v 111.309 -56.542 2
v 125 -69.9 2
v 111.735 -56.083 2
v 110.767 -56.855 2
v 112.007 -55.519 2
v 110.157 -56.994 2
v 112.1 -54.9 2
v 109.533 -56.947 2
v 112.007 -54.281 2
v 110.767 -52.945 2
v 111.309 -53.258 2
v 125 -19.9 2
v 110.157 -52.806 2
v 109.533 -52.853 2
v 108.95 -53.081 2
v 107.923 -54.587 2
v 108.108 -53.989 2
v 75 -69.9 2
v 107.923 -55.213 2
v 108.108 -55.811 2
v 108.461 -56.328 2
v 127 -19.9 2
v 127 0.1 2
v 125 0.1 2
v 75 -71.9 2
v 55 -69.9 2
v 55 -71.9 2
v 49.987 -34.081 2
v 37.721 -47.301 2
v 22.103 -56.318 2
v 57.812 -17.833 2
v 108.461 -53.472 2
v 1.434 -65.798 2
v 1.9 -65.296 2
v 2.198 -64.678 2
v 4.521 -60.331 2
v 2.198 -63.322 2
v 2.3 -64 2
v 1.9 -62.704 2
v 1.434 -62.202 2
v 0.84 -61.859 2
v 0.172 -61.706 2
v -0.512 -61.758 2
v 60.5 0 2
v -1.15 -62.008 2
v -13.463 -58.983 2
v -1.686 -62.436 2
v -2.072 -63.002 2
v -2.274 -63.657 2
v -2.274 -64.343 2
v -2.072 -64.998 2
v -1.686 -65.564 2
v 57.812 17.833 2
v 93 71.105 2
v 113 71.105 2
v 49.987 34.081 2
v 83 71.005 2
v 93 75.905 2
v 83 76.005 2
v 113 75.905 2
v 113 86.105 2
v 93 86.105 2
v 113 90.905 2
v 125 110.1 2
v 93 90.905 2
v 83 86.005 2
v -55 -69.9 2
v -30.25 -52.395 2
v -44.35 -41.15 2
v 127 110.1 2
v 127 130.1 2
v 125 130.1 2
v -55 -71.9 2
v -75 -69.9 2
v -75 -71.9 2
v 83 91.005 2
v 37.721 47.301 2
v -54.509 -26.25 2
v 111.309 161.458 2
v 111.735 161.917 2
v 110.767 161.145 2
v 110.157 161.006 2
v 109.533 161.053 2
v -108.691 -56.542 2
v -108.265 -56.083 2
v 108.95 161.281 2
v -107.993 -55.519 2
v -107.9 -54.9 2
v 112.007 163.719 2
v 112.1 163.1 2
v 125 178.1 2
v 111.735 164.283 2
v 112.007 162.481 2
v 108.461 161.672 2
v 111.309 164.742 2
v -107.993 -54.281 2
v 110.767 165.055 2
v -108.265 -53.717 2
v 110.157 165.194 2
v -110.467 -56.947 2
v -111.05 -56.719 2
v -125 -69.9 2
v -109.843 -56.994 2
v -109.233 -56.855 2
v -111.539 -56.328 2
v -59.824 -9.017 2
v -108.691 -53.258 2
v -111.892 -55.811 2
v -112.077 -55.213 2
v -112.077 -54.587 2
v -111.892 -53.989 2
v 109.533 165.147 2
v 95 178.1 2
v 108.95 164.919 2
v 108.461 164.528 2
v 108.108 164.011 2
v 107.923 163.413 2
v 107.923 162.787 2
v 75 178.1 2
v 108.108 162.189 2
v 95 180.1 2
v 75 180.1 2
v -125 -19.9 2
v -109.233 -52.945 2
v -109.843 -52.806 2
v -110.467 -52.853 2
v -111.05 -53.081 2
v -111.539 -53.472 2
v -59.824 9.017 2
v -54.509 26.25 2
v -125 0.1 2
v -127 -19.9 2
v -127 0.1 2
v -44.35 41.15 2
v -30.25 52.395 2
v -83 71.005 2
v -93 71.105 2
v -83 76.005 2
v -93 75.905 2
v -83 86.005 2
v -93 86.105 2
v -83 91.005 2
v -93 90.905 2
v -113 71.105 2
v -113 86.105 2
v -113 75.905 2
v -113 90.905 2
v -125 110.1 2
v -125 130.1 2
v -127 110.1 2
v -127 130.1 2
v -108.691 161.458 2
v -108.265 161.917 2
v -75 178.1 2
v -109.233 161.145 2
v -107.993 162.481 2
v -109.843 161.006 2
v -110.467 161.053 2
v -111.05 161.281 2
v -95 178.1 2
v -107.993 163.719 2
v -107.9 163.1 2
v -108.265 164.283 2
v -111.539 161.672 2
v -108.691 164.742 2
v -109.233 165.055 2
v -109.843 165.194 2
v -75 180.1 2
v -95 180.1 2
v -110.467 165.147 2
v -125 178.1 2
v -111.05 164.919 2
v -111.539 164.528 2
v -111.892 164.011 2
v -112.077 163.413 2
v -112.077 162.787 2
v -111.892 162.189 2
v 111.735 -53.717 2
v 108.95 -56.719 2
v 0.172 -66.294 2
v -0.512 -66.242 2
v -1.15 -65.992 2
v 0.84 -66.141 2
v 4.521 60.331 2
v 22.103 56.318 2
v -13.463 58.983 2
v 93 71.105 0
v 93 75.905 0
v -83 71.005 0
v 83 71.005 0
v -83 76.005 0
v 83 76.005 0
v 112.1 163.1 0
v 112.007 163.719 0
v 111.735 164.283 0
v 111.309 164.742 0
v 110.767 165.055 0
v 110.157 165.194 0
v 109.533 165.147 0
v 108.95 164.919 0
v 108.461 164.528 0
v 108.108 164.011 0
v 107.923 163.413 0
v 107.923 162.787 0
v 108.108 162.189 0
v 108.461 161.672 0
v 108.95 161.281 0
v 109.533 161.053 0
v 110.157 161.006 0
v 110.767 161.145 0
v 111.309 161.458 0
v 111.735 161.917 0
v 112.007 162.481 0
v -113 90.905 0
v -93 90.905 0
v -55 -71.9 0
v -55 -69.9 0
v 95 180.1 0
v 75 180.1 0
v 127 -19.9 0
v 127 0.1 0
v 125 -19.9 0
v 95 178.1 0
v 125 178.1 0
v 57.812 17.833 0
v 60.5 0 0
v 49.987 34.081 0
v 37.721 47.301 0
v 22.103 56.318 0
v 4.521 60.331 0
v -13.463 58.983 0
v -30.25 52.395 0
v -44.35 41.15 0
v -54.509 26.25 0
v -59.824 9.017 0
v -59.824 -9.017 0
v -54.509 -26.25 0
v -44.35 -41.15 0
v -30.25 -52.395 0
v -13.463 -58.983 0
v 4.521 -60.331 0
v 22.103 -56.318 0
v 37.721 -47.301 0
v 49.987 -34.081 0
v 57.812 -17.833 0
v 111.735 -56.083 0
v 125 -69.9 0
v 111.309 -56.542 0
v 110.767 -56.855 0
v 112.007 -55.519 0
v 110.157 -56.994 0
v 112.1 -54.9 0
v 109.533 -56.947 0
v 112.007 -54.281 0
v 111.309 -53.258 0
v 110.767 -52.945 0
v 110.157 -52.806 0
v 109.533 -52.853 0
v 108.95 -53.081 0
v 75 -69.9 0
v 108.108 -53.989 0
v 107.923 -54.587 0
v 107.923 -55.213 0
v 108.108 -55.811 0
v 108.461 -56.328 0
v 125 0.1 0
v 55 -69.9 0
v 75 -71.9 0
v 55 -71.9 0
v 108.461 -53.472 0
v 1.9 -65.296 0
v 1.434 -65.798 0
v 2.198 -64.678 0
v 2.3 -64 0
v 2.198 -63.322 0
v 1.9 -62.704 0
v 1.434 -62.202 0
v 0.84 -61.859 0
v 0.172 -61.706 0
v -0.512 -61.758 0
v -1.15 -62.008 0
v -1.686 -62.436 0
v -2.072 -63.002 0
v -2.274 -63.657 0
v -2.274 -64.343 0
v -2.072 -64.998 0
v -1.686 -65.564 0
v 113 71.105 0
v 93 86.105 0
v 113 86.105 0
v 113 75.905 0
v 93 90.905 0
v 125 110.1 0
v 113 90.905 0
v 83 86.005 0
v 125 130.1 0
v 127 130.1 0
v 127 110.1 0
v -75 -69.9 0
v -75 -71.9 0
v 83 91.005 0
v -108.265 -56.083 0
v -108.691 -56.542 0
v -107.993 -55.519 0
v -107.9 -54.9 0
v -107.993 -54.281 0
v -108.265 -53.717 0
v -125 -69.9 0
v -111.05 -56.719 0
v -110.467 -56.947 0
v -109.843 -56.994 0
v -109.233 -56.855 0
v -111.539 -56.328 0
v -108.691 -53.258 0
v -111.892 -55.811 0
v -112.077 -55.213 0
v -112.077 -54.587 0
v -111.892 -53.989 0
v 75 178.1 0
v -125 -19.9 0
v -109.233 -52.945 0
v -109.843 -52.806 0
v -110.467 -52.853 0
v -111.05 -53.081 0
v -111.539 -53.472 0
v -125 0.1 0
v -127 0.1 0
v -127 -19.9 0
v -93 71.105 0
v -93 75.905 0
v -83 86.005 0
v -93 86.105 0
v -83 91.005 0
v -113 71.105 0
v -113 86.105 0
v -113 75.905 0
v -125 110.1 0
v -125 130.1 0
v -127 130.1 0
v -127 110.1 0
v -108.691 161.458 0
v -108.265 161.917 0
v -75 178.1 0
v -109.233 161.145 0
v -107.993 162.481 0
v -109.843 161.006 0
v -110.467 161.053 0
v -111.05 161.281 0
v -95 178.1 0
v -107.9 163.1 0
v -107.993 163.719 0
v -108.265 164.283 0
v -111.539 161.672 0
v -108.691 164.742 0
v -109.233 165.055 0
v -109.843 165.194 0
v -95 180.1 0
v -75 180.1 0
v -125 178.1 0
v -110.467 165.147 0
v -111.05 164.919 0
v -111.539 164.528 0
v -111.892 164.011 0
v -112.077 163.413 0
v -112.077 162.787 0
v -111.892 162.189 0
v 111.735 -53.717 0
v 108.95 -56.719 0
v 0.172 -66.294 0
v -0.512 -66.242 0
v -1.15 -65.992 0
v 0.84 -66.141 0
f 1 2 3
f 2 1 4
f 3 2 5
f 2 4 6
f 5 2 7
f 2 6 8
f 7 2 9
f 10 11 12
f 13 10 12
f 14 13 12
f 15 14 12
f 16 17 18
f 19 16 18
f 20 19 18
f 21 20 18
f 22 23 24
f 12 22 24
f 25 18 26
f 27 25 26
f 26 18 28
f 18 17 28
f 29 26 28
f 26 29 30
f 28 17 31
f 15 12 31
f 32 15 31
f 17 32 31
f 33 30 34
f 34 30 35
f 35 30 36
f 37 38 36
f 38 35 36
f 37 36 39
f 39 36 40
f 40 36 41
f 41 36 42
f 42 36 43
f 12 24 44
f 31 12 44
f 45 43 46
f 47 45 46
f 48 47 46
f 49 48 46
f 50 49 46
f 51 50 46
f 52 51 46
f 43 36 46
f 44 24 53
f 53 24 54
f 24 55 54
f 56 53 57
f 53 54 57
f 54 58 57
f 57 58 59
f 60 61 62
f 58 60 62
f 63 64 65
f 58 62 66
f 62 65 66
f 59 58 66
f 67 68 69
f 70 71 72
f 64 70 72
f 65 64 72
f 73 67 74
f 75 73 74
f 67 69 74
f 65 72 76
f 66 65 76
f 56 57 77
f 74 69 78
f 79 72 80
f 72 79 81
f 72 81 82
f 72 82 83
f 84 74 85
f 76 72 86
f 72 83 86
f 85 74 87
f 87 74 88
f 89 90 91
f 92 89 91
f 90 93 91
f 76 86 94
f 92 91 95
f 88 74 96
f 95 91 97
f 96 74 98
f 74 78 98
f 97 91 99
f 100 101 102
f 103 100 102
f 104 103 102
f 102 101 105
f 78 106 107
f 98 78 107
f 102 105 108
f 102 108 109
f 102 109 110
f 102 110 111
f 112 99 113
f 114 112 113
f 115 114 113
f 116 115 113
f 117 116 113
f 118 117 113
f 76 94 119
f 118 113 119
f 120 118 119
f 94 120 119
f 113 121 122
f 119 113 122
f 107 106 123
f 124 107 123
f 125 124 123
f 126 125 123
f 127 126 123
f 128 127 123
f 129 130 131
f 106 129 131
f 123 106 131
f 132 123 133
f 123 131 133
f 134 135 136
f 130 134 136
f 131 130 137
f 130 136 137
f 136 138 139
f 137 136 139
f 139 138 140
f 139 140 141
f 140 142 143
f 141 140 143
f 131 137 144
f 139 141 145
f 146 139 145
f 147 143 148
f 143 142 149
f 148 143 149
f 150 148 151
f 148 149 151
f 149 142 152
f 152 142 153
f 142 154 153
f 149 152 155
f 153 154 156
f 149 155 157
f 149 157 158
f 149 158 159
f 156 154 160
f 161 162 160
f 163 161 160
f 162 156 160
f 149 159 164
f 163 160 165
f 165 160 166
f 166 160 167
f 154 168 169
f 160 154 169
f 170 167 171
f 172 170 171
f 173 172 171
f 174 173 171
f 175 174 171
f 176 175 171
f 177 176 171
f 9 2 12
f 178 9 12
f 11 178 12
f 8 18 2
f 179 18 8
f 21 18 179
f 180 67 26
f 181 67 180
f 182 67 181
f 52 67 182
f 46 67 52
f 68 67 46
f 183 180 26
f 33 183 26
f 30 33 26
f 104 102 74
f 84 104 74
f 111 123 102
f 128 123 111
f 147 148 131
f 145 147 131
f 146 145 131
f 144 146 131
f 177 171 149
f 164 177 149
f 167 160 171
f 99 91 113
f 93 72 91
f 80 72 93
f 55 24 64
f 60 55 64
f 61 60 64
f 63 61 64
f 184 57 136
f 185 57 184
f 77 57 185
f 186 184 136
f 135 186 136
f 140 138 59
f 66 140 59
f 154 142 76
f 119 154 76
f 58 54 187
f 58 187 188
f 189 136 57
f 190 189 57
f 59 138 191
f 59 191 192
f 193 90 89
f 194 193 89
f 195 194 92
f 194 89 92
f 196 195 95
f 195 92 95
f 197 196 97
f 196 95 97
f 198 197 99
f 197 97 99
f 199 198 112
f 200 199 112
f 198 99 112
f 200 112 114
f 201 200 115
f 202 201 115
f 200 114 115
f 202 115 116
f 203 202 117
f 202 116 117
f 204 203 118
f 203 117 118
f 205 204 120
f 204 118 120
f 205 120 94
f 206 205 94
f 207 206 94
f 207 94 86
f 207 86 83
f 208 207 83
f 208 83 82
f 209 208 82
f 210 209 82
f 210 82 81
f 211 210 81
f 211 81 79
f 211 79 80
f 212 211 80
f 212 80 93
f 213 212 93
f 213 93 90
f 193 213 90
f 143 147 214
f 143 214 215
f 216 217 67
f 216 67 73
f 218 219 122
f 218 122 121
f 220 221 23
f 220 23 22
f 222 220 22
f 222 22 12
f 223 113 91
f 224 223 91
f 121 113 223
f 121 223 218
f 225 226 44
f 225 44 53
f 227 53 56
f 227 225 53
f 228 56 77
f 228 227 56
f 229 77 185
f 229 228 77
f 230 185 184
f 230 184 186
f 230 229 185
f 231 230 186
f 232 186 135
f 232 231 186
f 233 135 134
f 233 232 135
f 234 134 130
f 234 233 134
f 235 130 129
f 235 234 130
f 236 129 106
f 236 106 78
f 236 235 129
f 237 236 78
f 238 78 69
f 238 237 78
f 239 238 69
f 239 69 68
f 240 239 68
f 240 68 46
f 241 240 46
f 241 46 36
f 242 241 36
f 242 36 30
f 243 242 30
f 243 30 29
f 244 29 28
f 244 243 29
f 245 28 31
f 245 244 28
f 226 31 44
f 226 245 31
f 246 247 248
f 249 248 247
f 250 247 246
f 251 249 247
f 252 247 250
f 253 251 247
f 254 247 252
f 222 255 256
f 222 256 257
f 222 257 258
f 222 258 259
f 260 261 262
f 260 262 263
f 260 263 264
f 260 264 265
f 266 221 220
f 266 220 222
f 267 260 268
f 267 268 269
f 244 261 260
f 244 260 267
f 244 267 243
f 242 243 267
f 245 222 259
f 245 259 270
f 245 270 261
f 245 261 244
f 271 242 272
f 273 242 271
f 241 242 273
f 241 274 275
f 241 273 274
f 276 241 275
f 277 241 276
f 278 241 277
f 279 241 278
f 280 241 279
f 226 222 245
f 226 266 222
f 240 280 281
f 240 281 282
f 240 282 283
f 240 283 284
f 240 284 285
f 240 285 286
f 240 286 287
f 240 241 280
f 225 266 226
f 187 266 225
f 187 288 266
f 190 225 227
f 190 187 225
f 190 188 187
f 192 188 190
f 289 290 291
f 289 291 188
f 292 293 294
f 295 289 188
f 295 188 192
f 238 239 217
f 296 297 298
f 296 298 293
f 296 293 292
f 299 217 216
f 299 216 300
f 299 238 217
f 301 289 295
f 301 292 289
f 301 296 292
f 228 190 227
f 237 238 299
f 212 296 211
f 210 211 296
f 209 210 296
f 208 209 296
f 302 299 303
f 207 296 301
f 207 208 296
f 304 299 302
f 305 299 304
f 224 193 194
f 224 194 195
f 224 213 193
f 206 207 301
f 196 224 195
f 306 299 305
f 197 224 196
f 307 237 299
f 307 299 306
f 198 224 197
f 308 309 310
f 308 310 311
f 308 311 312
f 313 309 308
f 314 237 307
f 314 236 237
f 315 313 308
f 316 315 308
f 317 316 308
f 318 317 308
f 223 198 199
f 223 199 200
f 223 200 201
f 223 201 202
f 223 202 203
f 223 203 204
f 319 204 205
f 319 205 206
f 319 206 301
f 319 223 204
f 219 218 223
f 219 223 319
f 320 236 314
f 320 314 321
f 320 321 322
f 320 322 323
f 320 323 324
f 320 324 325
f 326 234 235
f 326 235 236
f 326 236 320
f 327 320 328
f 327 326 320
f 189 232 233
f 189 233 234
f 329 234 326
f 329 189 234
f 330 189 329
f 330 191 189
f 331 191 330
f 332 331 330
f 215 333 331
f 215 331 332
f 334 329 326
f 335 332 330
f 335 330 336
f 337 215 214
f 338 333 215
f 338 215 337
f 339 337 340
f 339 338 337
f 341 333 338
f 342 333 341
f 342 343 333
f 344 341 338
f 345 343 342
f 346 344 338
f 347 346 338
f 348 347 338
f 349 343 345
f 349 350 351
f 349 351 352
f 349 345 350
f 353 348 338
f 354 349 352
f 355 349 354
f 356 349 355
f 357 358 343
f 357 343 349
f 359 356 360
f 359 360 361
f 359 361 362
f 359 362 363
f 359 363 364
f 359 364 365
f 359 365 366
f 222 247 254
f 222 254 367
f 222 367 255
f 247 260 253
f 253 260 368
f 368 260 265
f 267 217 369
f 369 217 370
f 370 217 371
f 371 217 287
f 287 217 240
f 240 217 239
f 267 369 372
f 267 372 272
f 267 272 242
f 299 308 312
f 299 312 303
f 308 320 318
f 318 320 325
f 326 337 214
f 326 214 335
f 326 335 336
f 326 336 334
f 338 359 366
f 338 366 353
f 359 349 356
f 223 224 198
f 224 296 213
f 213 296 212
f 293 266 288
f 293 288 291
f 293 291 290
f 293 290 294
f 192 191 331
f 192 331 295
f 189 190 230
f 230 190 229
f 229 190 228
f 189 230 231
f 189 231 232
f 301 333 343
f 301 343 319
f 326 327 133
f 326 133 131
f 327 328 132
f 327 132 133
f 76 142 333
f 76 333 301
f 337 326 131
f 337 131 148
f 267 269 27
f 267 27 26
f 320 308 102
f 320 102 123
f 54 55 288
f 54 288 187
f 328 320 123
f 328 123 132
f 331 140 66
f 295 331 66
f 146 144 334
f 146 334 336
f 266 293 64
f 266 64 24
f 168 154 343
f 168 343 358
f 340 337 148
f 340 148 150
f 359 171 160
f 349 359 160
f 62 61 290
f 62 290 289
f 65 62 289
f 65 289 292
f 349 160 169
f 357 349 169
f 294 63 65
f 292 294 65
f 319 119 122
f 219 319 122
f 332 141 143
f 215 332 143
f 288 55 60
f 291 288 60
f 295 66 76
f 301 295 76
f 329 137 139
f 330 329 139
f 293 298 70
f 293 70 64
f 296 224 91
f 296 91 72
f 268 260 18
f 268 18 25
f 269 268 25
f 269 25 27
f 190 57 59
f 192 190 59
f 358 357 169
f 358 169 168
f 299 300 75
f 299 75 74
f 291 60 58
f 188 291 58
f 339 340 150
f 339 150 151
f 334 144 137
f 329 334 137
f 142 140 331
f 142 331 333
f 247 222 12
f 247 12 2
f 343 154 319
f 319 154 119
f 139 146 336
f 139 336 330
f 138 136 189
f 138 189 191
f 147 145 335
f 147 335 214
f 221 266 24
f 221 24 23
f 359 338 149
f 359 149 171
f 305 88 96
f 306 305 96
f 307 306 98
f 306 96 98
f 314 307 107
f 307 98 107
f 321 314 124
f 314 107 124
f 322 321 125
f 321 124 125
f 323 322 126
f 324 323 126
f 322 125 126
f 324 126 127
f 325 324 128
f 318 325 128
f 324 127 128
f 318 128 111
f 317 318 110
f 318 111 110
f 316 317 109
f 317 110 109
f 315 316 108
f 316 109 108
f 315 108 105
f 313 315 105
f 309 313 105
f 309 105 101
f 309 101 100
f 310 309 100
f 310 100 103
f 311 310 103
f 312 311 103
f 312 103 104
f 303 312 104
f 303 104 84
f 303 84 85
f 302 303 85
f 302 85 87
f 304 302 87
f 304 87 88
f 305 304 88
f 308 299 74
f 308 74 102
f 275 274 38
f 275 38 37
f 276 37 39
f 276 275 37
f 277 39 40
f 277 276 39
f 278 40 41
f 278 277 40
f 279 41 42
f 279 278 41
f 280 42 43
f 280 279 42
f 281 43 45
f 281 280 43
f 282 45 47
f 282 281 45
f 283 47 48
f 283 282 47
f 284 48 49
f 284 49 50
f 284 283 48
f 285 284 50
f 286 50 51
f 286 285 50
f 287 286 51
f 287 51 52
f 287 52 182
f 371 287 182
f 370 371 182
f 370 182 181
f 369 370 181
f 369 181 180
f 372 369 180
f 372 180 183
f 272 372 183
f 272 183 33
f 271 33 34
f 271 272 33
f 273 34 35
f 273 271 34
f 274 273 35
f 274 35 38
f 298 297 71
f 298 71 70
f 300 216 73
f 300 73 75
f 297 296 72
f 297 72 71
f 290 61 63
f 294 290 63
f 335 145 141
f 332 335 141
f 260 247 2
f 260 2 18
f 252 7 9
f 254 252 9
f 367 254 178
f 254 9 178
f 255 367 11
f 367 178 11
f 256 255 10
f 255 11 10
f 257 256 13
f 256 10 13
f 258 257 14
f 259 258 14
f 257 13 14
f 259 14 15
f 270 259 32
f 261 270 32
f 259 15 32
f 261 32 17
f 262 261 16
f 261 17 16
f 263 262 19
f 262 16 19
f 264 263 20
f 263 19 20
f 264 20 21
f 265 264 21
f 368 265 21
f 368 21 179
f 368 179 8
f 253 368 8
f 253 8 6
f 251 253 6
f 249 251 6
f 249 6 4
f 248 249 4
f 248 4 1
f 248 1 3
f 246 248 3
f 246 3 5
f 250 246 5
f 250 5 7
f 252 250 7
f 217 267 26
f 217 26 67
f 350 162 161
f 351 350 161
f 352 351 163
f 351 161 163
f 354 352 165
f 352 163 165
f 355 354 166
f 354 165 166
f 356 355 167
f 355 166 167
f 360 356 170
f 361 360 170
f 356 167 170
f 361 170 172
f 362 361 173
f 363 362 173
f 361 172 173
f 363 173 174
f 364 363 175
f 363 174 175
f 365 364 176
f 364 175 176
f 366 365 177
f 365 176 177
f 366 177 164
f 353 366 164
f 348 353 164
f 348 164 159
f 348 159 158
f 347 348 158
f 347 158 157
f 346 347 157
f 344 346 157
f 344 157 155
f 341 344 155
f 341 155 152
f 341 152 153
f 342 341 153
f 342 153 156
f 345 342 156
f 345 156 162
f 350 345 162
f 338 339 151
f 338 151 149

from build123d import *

# Parameters (mm, degrees)
SKETCH1_R           = 60.5
SKETCH1_R_2         = 2.3
BOSS_EXTRUDE1_DEPTH = 2
SKETCH3_W           = 20
SKETCH3_H           = 4.8
CUT_EXTRUDE1_DEPTH  = 5
SKETCH4_W           = 165.999999998
SKETCH4_H           = 5
CUT_EXTRUDE2_DEPTH  = 5
SKETCH5_R           = 2.1
CUT_EXTRUDE3_DEPTH  = 5
SKETCH6_W           = 30
SKETCH6_H           = 2
SKETCH6_W_2         = 150
CUT_EXTRUDE4_DEPTH  = 5
SKETCH7_R           = 2.1
CUT_EXTRUDE5_DEPTH  = 5


with BuildPart() as part:
    # Sketch1 → Boss-Extrude1 (new body)
    with BuildSketch(Plane.XY):
        Polygon((125.000000001, -69.9), (75.000000001, -69.9), (75.000000001, -71.9), (55.000000001, -71.9), (55.000000001, -69.9), (-54.999999999, -69.9), (-54.999999999, -71.9), (-74.999999999, -71.9), (-74.999999999, -69.9), (-124.999999999, -69.9), (-124.999999999, -19.9), (-126.999999999, -19.9), (-126.999999999, 0.1), (-124.999999999, 0.1), (-124.999999999, 110.1), (-126.999999999, 110.1), (-126.999999999, 130.1), (-124.999999999, 130.1), (-124.999999999, 180.1), (125.000000001, 180.1), (125.000000001, 130.1), (127.000000001, 130.1), (127.000000001, 110.1), (125.000000001, 110.1), (125.000000001, 0.1), (127.000000001, 0.1), (127.000000001, -19.9), (125.000000001, -19.9), align=None)
        Circle(SKETCH1_R, mode=Mode.SUBTRACT)
        with Locations((0, -64)):
            Circle(SKETCH1_R_2, mode=Mode.SUBTRACT)
    extrude(amount=BOSS_EXTRUDE1_DEPTH)

    # Sketch3 → Cut-Extrude1 (cut)
    with BuildSketch(Plane.XY.offset(2)):
        with Locations((-102.999999999, 88.505234687)):
            Rectangle(SKETCH3_W, SKETCH3_H)
        with Locations((-102.999999999, 73.505234687)):
            Rectangle(SKETCH3_W, SKETCH3_H)
    cut_extrude1 = extrude(amount=-CUT_EXTRUDE1_DEPTH, mode=Mode.SUBTRACT)

    # Mirror1: Cut-Extrude1 across plane
    add(cut_extrude1.mirror(Plane(origin=(0, 0, 0), x_dir=(0, 0, 1), z_dir=(1, 0, 0))), mode=Mode.SUBTRACT)

    # Sketch4 → Cut-Extrude2 (cut)
    with BuildSketch(Plane.XY.offset(2)):
        with Locations((0, 88.505234687)):
            Rectangle(SKETCH4_W, SKETCH4_H)
        with Locations((0, 73.505234687)):
            Rectangle(SKETCH4_W, SKETCH4_H)
    extrude(amount=-CUT_EXTRUDE2_DEPTH, mode=Mode.SUBTRACT)

    # Sketch5 → Cut-Extrude3 (cut)
    with BuildSketch(Plane.XY.offset(2)):
        with Locations((-109.999999999, -54.9)):
            Circle(SKETCH5_R)
        with Locations((110.000000001, -54.9)):
            Circle(SKETCH5_R)
    extrude(amount=-CUT_EXTRUDE3_DEPTH, mode=Mode.SUBTRACT)

    # Sketch6 → Cut-Extrude4 (cut)
    with BuildSketch(Plane.XY.offset(2)):
        with Locations((-109.999999999, 179.1)):
            Rectangle(SKETCH6_W, SKETCH6_H)
        with Locations((1e-09, 179.1)):
            Rectangle(SKETCH6_W_2, SKETCH6_H)
        with Locations((110.000000001, 179.1)):
            Rectangle(SKETCH6_W, SKETCH6_H)
    extrude(amount=-CUT_EXTRUDE4_DEPTH, mode=Mode.SUBTRACT)

    # Sketch7 → Cut-Extrude5 (cut)
    with BuildSketch(Plane.XY.offset(2)):
        with Locations((-109.999999999, 163.1)):
            Circle(SKETCH7_R)
        with Locations((110.000000001, 163.1)):
            Circle(SKETCH7_R)
    extrude(amount=-CUT_EXTRUDE5_DEPTH, mode=Mode.SUBTRACT)


solid = part.part
